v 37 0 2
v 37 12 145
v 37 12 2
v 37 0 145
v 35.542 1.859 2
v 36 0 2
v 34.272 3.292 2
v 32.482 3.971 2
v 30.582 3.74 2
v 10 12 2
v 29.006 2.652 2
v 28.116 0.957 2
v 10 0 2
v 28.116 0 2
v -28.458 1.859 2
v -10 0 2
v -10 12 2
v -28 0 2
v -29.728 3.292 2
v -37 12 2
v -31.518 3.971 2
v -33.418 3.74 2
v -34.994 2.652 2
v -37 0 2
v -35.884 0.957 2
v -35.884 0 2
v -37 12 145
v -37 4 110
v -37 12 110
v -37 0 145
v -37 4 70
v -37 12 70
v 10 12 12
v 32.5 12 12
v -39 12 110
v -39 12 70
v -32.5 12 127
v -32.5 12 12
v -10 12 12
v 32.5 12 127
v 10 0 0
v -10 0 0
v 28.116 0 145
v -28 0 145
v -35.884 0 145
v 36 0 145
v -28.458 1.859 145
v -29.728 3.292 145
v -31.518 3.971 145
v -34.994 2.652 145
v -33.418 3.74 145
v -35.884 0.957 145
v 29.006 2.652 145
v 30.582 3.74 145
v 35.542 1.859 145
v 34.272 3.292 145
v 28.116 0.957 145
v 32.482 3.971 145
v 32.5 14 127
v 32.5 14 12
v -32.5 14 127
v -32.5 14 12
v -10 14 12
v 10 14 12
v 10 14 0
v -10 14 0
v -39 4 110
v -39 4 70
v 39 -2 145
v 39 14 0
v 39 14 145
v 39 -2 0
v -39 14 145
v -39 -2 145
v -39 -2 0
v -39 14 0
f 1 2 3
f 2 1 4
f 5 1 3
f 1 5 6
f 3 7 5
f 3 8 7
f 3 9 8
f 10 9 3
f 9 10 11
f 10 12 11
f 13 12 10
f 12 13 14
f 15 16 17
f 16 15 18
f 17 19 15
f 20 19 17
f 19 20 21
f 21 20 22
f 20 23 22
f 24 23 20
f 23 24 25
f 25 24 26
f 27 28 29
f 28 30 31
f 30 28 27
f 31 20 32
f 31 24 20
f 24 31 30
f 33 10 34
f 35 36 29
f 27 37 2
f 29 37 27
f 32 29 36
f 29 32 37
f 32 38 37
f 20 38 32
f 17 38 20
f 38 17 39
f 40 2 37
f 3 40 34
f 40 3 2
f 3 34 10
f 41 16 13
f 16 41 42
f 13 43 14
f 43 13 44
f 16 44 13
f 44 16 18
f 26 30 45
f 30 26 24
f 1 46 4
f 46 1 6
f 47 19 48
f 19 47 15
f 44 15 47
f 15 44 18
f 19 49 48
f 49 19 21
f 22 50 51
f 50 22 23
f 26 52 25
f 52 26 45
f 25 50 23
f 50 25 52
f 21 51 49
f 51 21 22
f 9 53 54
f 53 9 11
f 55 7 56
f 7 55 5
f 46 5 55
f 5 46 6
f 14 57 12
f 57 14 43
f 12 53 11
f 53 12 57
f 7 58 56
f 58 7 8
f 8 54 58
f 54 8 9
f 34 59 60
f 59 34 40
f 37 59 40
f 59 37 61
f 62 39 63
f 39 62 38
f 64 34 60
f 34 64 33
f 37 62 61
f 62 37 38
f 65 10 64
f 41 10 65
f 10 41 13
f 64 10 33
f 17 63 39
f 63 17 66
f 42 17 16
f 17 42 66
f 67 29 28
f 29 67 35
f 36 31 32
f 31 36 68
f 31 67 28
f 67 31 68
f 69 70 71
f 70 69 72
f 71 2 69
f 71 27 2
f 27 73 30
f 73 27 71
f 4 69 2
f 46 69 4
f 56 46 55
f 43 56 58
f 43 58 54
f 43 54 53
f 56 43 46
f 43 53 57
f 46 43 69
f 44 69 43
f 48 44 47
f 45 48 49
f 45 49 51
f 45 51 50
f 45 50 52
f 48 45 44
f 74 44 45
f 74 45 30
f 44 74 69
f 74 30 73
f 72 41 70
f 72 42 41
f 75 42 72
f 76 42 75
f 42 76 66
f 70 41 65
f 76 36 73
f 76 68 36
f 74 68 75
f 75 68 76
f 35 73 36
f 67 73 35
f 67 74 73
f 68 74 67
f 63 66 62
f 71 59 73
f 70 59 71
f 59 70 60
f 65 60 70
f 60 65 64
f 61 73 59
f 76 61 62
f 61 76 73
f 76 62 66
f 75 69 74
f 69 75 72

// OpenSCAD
include <config.scad>

tel_l = 141;
tel_lg = 74;
tel_e = 12;
tel_e2 = 8;
e = 2;

tel_ecran_lg = 65;
tel_ecran_h = 115;

module tel(l = tel_l, ecran = true){
    difference(){
        translate([-tel_lg/2, 0,0])cube([tel_lg, tel_e, l]);
        translate([-tel_lg/2+5, 0,-1])cylinder(r = (tel_e - tel_e2), l+2);
        translate([ tel_lg/2-5, 0,-1])cylinder(r = (tel_e - tel_e2), l+2);
    }
    if(ecran){
        translate([-tel_ecran_lg/2,tel_e2,10])cube([tel_ecran_lg, 20, tel_ecran_h]);
        translate([-10, 0, -5])cube([20, 20, 20]);
        translate([-tel_lg/2-2*e,tel_e-tel_e2,68])cube([tel_ecran_lg, tel_e2, 40]);
    }
}


module test(){
    difference(){
        translate([-tel_lg/2-2, -2,0])cube([tel_lg+4, tel_e+4, 10]);
        tel();
    }
}

module full_support(){
    difference(){
        translate([-tel_lg/2-e, -e,0])cube([tel_lg+2*e, tel_e+2*e, tel_l+2*e]);
        translate([0,0, e])tel(tel_l+2*e);
        
    }
}

module support_venti(lg, l){
    e1 = 2;
    e2 = 3;
    e3 = 2;
    l1 = 12;
    difference(){
        union(){
            cube([l1, e1 + e2 + e3, lg]);
            cube([l, e1, lg]);
        }
        translate([4, e1, -1])cube([l1-4-0.2, e2, lg + 2]);
    }
}

module support_voiture(){
    l = 37;
    l2 = 60;
    difference(){
        translate([0, 0, l2]) rotate([0,180,0])full_support();
        translate([-100, -100, -100]) cube([200,200,100]);
        translate([-10, 0, l2-10]) cube([20,20,20]);
    }
    for(i = [-1,1]){
        translate([i*20, -l, 0]) rotate([90, 0, 90])support_venti(5, l);
    }
}


full_support();
